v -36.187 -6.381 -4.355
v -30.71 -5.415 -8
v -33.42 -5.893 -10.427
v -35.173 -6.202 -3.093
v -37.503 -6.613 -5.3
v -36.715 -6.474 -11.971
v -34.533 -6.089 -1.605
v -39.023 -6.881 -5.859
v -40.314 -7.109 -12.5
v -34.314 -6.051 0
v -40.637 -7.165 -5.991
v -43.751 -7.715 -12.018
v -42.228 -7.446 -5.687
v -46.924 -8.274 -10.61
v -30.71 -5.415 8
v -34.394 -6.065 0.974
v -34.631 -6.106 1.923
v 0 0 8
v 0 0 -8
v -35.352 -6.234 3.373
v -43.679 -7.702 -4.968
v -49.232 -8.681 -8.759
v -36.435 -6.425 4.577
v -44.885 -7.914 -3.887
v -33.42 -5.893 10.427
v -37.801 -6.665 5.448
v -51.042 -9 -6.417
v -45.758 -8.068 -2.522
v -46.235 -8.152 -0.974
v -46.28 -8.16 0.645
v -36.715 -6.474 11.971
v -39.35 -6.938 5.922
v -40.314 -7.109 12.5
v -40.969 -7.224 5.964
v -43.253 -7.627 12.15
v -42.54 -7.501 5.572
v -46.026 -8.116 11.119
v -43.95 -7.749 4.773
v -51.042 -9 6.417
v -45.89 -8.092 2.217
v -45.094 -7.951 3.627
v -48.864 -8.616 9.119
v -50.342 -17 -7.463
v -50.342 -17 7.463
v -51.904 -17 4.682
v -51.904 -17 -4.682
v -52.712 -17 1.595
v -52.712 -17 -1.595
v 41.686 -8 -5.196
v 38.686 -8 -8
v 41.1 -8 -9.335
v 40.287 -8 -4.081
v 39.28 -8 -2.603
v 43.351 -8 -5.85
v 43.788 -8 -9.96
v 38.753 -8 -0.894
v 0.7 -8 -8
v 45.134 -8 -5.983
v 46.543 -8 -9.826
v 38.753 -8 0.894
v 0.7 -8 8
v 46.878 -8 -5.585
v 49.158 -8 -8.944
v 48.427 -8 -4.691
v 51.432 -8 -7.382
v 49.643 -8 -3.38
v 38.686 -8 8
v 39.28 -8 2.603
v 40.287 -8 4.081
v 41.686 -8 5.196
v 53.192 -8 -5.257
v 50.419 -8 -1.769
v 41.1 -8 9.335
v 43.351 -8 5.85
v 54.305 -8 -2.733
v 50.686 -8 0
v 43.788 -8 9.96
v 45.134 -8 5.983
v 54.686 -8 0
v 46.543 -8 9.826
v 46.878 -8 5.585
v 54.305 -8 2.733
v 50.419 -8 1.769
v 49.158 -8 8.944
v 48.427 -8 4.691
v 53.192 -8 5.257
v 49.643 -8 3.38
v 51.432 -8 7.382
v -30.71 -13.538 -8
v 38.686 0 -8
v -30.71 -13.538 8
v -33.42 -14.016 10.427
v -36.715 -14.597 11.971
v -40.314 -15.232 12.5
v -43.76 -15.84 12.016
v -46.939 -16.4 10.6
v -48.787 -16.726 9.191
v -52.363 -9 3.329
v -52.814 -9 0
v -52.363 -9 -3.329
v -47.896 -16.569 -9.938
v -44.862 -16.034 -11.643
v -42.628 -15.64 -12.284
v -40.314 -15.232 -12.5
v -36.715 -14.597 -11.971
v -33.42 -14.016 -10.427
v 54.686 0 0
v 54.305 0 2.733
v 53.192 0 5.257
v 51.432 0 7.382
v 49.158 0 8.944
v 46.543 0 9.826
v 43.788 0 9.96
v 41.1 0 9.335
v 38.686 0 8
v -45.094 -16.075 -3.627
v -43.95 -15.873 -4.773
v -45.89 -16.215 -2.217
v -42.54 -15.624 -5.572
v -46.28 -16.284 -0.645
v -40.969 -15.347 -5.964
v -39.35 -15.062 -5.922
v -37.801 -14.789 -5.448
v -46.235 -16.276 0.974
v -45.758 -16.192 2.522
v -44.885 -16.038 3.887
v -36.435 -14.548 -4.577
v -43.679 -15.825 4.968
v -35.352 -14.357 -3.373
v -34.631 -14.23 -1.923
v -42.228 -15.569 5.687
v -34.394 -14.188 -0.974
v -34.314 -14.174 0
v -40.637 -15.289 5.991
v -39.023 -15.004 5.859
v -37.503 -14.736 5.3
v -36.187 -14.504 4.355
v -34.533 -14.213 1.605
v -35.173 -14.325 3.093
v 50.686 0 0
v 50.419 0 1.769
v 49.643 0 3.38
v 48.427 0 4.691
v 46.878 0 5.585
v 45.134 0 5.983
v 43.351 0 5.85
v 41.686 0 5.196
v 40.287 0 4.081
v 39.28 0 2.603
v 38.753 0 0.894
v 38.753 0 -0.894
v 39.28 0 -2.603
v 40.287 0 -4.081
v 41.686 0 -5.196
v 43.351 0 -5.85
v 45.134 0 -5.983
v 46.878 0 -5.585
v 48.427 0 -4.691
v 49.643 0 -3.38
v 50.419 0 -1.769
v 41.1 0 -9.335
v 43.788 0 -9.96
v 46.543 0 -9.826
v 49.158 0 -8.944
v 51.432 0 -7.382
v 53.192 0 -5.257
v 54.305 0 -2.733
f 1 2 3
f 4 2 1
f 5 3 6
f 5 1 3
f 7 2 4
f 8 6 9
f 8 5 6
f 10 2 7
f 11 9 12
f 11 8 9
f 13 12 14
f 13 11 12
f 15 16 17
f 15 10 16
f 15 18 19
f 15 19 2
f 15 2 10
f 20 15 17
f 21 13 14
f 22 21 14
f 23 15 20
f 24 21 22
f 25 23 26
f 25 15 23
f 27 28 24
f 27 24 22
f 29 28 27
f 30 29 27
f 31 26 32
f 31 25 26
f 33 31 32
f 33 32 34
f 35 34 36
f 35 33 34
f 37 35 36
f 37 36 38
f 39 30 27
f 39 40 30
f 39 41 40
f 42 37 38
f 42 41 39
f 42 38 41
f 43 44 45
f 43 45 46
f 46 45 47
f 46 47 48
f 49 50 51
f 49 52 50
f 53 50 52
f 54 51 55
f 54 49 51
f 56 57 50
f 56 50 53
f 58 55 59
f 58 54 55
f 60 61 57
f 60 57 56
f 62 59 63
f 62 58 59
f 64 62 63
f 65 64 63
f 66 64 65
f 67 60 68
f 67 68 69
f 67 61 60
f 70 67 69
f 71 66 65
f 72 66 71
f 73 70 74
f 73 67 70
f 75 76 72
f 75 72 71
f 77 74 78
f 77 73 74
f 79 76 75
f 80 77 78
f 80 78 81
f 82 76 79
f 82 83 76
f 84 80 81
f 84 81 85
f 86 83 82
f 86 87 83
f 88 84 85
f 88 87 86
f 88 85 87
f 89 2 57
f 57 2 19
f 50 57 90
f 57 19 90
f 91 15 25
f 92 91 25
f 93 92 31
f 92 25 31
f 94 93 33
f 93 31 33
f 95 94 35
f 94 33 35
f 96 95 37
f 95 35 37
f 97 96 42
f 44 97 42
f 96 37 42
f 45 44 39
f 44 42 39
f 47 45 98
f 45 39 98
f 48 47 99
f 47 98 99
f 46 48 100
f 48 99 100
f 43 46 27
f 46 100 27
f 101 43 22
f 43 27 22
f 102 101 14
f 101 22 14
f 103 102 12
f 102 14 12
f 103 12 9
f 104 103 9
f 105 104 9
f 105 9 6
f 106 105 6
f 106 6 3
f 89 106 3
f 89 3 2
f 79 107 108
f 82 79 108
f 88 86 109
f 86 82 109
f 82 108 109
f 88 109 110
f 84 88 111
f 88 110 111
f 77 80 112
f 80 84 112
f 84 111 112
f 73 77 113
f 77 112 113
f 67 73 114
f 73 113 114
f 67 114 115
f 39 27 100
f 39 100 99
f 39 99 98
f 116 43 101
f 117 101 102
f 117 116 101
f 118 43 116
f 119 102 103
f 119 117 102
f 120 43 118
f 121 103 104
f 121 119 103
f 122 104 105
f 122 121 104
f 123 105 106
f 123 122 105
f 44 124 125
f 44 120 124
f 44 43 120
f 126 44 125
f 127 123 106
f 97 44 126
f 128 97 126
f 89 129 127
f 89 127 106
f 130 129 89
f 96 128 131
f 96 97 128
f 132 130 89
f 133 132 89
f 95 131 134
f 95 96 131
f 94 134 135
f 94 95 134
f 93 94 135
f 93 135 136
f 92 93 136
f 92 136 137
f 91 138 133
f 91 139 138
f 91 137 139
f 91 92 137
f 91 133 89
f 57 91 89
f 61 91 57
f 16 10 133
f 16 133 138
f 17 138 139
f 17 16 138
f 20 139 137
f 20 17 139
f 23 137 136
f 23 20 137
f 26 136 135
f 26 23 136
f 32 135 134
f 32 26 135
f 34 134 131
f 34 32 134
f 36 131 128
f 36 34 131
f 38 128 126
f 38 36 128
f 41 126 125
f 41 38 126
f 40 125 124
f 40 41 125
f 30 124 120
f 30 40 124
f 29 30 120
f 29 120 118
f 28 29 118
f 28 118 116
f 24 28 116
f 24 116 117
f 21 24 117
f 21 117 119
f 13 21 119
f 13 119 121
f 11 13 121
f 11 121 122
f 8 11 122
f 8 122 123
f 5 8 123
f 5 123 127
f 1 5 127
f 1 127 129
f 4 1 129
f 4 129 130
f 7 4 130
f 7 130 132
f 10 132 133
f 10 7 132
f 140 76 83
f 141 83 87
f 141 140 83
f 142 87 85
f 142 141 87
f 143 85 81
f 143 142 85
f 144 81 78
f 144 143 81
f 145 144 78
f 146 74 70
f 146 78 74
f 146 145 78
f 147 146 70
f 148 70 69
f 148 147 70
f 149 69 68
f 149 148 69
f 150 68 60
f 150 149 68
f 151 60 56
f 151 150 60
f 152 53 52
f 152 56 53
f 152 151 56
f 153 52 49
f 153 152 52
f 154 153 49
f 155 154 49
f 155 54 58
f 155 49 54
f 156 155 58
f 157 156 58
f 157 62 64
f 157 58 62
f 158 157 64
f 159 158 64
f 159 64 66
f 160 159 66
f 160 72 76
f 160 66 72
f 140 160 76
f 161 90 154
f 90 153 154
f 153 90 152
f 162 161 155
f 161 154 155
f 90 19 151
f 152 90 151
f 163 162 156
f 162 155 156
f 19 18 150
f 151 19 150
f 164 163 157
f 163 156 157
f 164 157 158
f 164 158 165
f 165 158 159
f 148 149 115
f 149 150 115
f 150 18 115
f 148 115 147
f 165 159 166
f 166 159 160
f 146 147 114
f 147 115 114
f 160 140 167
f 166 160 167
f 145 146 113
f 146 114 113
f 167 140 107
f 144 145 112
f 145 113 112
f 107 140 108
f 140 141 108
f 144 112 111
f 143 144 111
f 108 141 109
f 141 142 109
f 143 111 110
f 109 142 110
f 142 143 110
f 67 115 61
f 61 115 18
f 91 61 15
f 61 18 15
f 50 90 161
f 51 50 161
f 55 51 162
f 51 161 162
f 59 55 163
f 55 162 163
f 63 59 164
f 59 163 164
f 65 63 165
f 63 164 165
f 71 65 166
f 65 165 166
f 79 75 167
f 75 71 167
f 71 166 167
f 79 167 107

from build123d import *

# Parameters (mm, degrees)
F0_R     = 6
F1_DEPTH = 25
F3_DEPTH = 12.5


with BuildPart() as f1:
    # F0 (on Front) → F1 (new body)
    with BuildSketch(Plane.XZ):
        with BuildLine():
            ThreePointArc((-30.709658, -8), (-28.560439, -4.253905), (-27.814344, 0))
            ThreePointArc((-27.814344, 0), (-28.560439, 4.253905), (-30.709658, 8))
            ThreePointArc((-30.709658, 8), (-52.814344, 0), (-30.709658, -8))
        make_face()
        with Locations((-40.314344, 0)):
            Circle(F0_R, mode=Mode.SUBTRACT)
        with BuildLine():
            ThreePointArc((-30.709658, 8), (-28.560439, 4.253905), (-27.814344, 0))
            ThreePointArc((-27.814344, 0), (-28.560439, -4.253905), (-30.709658, -8))
            Line((-30.709658, -8), (38.685656, -8))
            ThreePointArc((38.685656, -8), (34.685656, 0), (38.685656, 8))
            Line((38.685656, 8), (-30.709658, 8))
        make_face()
        with BuildLine():
            ThreePointArc((54.685656, 0), (49.157792, 8.944272), (38.685656, 8))
            ThreePointArc((38.685656, 8), (34.685656, 0), (38.685656, -8))
            ThreePointArc((38.685656, -8), (49.157792, -8.944272), (54.685656, 0))
        make_face()
        with Locations((44.685656, 0)):
            Circle(F0_R, mode=Mode.SUBTRACT)
    extrude(amount=F1_DEPTH)

    # F2 (on Top) → F3 (intersect, symmetric)
    with BuildSketch(Plane.XY):
        Polygon((-51.041536, -9), (-52.814344, -9), (-52.814344, -17), (-50.341627, -17), (0.699909, -8), (54.685656, -8), (54.685656, 0), (25.572881, 0), (0, 0), align=None)
    extrude(amount=F3_DEPTH, both=True, mode=Mode.INTERSECT)


solid = f1.part
